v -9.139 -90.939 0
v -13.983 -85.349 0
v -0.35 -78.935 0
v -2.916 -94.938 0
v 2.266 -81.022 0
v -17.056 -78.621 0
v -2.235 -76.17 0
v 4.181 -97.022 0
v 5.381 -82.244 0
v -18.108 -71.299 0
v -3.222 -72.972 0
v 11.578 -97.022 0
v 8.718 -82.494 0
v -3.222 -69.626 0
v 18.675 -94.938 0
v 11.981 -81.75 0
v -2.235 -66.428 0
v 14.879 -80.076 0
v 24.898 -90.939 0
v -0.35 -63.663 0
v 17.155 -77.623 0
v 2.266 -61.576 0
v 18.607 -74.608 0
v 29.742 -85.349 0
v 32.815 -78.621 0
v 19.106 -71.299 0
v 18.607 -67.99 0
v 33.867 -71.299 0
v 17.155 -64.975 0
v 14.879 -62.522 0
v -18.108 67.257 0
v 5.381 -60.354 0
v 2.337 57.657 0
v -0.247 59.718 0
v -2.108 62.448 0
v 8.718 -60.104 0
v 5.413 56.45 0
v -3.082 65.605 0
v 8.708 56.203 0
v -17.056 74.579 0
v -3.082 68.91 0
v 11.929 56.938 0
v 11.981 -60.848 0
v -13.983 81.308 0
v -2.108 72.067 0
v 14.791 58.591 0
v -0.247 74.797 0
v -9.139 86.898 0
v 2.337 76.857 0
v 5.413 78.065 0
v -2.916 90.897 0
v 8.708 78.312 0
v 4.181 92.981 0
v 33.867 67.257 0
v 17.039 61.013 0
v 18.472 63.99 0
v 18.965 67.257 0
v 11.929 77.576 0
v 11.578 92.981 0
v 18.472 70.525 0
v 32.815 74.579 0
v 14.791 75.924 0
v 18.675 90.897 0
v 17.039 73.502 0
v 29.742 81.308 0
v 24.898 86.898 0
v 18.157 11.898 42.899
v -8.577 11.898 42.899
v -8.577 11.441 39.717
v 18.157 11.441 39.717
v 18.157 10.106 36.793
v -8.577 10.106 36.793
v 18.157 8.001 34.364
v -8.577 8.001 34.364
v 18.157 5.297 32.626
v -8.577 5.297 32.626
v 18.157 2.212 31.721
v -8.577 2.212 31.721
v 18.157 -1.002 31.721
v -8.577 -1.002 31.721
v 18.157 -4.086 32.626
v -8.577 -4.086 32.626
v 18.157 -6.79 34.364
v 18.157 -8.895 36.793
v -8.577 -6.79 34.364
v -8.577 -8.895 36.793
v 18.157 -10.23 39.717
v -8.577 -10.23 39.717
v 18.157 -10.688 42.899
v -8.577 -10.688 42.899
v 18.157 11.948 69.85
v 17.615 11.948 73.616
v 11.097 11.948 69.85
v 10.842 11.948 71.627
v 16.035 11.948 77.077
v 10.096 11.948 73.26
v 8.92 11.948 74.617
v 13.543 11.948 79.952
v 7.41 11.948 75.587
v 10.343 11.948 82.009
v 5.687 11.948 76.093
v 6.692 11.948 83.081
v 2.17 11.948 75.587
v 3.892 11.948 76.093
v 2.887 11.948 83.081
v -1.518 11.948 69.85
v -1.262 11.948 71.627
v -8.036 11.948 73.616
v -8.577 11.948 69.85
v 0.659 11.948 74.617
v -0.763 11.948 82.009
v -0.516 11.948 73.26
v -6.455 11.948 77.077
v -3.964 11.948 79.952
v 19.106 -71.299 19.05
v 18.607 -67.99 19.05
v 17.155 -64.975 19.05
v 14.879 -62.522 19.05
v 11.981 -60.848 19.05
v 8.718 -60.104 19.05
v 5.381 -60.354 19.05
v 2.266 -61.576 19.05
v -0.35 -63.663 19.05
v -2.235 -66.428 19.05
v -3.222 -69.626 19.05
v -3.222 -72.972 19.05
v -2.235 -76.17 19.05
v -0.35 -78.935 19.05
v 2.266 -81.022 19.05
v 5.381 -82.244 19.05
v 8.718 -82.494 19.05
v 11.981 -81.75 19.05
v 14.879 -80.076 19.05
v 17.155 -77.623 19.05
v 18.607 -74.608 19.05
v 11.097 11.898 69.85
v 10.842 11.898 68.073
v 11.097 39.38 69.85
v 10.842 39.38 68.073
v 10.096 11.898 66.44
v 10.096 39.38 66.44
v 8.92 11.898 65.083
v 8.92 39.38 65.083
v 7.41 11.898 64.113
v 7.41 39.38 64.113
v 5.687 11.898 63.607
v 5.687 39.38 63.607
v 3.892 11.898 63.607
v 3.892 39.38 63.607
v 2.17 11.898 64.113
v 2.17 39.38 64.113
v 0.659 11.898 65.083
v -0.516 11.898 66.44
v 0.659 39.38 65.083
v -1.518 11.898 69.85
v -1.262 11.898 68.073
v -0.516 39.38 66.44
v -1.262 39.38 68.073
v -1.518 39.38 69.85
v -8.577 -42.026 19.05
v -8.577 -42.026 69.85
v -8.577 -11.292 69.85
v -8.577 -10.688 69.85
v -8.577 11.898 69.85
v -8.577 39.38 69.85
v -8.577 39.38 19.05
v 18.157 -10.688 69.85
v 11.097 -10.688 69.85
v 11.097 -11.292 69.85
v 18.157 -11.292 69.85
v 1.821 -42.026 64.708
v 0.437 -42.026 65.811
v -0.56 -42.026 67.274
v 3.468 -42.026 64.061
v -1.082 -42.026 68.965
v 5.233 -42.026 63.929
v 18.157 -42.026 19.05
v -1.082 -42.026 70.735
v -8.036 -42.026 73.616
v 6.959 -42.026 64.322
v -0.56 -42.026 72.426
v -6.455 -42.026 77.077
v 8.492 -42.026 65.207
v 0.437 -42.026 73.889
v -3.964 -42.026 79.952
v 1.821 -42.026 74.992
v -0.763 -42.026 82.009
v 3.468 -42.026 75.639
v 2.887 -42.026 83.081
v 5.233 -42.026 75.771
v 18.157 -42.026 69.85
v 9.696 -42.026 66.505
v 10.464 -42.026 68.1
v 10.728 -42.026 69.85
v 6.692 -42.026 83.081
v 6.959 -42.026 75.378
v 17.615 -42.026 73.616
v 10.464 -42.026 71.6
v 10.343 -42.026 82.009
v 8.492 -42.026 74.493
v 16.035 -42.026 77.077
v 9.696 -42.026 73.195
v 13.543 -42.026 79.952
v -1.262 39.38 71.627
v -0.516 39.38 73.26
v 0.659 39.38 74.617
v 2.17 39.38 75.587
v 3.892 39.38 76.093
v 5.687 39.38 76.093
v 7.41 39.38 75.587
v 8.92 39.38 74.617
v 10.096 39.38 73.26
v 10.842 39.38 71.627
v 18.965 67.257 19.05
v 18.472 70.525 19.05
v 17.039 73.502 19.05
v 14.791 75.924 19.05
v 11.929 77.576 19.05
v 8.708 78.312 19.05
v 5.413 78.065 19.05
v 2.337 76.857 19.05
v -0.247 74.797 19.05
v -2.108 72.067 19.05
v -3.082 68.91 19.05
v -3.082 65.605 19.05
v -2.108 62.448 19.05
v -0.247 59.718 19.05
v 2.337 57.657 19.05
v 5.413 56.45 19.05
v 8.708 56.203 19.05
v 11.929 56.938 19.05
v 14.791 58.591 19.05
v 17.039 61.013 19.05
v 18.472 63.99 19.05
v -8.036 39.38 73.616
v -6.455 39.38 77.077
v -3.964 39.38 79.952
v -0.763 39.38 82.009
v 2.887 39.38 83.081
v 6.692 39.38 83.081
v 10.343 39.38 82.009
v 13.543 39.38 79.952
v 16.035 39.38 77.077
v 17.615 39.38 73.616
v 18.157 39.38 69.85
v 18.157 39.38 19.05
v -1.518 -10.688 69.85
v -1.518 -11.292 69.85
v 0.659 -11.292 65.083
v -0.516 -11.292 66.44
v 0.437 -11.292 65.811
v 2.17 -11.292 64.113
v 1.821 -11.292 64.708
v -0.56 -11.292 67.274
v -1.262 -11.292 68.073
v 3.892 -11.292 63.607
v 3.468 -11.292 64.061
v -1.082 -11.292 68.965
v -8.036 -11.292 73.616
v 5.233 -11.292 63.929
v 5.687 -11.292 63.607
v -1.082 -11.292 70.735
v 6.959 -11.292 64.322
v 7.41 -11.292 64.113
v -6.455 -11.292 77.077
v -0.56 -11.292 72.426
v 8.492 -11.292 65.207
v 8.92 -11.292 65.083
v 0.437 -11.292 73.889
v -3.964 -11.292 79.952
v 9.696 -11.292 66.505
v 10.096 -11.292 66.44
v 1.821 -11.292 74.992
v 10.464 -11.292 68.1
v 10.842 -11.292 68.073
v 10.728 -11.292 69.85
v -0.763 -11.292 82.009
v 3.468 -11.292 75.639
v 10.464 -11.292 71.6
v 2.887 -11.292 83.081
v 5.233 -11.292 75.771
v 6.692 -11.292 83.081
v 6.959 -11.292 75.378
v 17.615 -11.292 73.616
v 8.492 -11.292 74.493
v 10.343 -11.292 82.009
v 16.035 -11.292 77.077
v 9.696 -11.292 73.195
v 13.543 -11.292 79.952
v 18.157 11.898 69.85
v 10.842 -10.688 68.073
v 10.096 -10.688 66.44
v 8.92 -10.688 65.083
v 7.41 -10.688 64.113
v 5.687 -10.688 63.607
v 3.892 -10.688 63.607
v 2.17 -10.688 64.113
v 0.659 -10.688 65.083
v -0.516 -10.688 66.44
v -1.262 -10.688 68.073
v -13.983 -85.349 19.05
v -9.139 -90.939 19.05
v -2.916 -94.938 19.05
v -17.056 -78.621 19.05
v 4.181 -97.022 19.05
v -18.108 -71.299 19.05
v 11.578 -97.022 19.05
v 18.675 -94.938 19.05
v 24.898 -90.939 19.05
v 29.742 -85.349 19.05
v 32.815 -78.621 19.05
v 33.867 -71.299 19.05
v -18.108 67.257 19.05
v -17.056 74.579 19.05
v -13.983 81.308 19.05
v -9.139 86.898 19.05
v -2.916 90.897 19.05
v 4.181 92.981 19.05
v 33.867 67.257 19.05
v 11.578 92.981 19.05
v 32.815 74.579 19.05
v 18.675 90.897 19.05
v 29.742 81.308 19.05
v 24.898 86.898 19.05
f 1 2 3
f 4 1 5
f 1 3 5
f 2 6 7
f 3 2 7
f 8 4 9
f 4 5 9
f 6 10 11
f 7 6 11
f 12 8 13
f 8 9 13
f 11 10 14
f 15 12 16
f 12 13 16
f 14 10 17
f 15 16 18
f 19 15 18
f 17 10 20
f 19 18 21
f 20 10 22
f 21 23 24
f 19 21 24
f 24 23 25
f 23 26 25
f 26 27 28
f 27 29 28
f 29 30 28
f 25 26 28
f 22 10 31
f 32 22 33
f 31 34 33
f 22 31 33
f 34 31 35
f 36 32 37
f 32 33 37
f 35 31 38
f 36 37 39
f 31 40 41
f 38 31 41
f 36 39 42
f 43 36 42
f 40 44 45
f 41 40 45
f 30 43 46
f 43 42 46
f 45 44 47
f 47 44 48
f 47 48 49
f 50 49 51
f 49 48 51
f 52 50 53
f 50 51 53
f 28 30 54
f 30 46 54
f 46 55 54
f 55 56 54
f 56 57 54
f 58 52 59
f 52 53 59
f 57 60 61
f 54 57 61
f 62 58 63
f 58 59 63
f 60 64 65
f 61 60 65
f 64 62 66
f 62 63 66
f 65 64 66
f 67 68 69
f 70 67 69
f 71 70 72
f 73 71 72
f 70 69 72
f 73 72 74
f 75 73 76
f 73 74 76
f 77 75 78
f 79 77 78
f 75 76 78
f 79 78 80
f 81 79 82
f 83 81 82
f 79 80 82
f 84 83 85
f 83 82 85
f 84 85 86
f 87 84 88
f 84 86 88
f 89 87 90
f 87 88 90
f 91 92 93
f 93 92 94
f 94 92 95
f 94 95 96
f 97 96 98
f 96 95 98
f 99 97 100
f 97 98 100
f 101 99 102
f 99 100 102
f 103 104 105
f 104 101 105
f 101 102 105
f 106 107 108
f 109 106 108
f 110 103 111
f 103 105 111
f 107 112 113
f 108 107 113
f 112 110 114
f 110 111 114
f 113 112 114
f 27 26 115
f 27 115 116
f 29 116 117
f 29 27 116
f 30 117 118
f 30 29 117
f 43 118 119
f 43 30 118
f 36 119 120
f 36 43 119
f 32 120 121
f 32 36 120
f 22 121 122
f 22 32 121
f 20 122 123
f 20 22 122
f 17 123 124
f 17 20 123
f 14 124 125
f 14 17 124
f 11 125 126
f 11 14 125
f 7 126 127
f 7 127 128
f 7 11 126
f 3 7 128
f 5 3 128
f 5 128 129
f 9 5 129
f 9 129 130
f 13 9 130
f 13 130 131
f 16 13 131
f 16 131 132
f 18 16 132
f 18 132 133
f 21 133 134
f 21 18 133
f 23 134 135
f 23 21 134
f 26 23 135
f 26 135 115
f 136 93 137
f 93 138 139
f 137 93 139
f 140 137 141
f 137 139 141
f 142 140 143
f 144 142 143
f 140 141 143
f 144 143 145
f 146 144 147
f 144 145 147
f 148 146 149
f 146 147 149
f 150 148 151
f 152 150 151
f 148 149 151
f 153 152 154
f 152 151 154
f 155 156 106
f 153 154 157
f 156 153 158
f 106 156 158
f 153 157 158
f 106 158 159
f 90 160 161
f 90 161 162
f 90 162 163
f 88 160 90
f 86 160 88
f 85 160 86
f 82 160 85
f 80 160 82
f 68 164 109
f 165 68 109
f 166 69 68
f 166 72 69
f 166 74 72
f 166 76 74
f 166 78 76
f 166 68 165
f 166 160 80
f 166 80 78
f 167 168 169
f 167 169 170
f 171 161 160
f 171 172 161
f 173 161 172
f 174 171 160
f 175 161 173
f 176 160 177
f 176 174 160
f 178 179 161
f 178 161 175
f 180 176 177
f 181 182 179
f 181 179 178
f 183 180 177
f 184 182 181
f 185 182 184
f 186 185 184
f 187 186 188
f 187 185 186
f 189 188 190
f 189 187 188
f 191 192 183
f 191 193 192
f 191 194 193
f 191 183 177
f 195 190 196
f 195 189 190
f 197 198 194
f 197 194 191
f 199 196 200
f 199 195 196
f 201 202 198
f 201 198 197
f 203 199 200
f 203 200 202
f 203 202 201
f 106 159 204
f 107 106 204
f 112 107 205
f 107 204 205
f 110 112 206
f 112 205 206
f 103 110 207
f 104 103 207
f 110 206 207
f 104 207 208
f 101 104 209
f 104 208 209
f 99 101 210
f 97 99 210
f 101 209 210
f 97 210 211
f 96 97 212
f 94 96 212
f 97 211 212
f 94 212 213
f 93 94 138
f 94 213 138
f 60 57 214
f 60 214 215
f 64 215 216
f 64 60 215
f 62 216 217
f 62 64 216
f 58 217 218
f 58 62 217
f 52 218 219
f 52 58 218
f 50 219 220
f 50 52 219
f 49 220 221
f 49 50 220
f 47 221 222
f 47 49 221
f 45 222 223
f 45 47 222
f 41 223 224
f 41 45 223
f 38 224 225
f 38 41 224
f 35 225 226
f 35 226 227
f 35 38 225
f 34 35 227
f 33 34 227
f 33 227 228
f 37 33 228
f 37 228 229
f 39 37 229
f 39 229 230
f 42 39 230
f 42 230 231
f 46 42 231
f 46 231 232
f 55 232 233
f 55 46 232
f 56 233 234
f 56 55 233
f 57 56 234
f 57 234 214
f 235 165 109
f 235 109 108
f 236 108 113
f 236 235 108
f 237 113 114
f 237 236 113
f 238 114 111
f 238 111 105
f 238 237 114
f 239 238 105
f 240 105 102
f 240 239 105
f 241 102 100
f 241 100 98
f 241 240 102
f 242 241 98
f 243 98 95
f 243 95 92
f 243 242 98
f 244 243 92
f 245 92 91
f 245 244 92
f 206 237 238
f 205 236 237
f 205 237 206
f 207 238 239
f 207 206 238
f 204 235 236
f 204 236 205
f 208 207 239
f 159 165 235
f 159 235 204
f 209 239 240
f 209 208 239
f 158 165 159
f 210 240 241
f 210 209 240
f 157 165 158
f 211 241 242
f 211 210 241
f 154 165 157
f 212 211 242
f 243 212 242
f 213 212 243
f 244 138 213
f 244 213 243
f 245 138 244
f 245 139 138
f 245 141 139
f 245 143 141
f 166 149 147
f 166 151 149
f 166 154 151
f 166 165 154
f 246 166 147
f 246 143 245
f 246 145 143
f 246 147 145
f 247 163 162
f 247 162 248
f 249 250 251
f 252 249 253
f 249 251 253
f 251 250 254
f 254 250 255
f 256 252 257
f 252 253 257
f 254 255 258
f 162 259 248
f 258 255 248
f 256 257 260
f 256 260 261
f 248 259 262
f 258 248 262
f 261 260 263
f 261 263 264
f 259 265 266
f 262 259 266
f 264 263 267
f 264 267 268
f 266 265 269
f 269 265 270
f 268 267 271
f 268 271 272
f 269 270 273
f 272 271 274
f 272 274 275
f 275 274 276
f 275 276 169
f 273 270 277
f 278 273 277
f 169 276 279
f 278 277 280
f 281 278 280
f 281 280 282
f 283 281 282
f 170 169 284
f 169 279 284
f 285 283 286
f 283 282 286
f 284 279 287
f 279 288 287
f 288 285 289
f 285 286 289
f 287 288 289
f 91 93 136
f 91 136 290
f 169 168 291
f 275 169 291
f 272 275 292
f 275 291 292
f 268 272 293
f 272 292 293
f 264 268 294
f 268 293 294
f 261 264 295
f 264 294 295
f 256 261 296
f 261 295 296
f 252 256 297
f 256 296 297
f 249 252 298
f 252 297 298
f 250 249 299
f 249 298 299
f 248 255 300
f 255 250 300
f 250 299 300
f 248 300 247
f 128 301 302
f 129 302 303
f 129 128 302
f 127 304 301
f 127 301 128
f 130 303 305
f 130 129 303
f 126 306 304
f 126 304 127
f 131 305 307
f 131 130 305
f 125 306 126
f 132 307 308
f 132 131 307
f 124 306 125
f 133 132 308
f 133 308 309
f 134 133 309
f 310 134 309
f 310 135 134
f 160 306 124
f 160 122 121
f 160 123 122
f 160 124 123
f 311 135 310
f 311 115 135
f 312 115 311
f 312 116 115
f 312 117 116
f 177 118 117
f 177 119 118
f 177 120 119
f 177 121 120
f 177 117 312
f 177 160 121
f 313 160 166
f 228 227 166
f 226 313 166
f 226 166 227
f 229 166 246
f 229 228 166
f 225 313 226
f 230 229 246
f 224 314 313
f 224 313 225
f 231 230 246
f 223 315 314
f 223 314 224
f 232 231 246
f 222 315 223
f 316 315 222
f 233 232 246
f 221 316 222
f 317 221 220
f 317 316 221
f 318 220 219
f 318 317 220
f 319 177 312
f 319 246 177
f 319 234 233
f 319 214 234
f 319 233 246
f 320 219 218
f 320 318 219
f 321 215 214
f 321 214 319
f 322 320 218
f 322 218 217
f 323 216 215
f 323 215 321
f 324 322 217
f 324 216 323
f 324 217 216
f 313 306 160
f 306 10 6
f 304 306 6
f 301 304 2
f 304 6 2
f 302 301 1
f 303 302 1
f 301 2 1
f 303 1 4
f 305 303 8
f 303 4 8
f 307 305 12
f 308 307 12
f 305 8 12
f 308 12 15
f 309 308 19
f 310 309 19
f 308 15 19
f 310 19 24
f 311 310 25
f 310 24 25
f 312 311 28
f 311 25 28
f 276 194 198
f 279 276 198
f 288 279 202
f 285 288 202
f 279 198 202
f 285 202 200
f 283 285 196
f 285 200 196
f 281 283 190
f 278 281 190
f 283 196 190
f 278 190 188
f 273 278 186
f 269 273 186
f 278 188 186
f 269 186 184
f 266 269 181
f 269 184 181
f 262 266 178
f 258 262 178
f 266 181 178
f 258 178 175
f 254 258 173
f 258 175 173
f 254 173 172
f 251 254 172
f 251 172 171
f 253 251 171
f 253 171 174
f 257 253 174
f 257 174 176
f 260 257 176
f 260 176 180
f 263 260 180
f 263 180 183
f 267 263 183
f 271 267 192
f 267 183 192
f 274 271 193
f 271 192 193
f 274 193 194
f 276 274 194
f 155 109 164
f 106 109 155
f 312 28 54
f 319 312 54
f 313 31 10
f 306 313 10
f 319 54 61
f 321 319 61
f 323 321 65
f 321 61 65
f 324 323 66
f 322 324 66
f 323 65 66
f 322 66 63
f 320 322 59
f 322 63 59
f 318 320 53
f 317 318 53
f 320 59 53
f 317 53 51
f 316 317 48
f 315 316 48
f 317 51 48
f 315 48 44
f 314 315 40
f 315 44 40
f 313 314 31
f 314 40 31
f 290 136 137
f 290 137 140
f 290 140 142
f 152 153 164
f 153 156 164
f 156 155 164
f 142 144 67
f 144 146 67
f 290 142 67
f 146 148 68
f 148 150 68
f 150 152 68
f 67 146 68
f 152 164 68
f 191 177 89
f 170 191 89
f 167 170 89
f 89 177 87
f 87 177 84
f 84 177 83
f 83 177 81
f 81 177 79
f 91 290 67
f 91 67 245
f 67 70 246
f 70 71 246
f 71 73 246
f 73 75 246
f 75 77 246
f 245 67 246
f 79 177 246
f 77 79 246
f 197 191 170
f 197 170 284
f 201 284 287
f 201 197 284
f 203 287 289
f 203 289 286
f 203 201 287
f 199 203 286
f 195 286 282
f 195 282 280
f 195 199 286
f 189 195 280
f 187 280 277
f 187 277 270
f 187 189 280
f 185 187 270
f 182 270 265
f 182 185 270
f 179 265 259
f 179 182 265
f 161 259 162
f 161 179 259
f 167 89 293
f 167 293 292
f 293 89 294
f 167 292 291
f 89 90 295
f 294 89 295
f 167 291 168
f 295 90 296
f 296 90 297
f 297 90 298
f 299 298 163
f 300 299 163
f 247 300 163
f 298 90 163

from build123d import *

# Parameters (mm, degrees)
F0_R      = 11.2267046734
F0_R_2    = 11.0852071495
F1_DEPTH  = 19.05
F2_W      = 26.7343660817
F2_H      = 81.4062468708
F3_DEPTH  = 50.8
F5_DEPTH  = 42.4459602142
F6_R      = 6.3073673096
F7_DEPTH  = 27.432
F8_DEPTH  = 136.6678641567
F9_R      = 5.937984747
F10_DEPTH = 30.734


with BuildPart() as f1:
    # F0 (on Top) → F1 (new body)
    with BuildSketch(Plane.XY):
        with BuildLine():
            Line((-18.1084536016, 67.2573745251), (-18.1084536016, -71.298904717))
            ThreePointArc((-18.1084536016, -71.298904717), (7.8795179725, -97.286876291), (33.8674895465, -71.298904717))
            Line((33.8674895465, -71.298904717), (33.8674895465, 67.2573745251))
            ThreePointArc((33.8674895465, 67.2573745251), (7.8795179725, 93.2453460991), (-18.1084536016, 67.2573745251))
        make_face()
        with Locations((7.8795179725, -71.298904717)):
            Circle(F0_R, mode=Mode.SUBTRACT)
        with Locations((7.8795179725, 67.2573745251)):
            Circle(F0_R_2, mode=Mode.SUBTRACT)
    extrude(amount=F1_DEPTH)

    # F2 (on face) → F3 (join)
    with BuildSketch(Plane.XY.offset(19.05)):
        with Locations((4.7897123732, -1.3231355697)):
            Rectangle(F2_W, F2_H)
    extrude(amount=F3_DEPTH)

    # F4 (on face) → F5 (cut, through all)
    with BuildSketch(Plane(origin=(-8.5774706677, 0, 0), x_dir=(0, -1, 0), z_dir=(-1, 0, 0))):
        with BuildLine():
            Line((10.6878159568, 69.85), (-11.8984412402, 69.85))
            Line((-11.8984412402, 69.85), (-11.8984412402, 42.8989976645))
            ThreePointArc((-11.8984412402, 42.8989976645), (-0.6053126417, 31.605869066), (10.6878159568, 42.8989976645))
            Line((10.6878159568, 42.8989976645), (10.6878159568, 69.85))
        make_face()
    extrude(amount=-F5_DEPTH, mode=Mode.SUBTRACT)

    # F6 (on face) → F7 (join)
    with BuildSketch(Plane(origin=(0, 39.3799878657, 0), x_dir=(-1, 0, 0), z_dir=(0, 1, 0))):
        with Locations((-4.7897123732, 69.85)):
            Circle(F6_R)
        with BuildLine():
            Line((1.5176549365, 69.85), (8.5774706677, 69.85))
            ThreePointArc((8.5774706677, 69.85), (-4.7897123732, 83.2171830408), (-18.156895414, 69.85))
            Line((-18.156895414, 69.85), (-11.0970796828, 69.85))
            ThreePointArc((-11.0970796828, 69.85), (-4.7897123732, 76.1573673096), (1.5176549365, 69.85))
        make_face()
    extrude(amount=-F7_DEPTH)

    # F6 (on face) → F8 (cut, through all)
    with BuildSketch(Plane(origin=(0, 39.3799878657, 0), x_dir=(-1, 0, 0), z_dir=(0, 1, 0))):
        with BuildLine():
            ThreePointArc((-11.0970796828, 69.85), (-4.7897123732, 63.5426326904), (1.5176549365, 69.85))
            Line((1.5176549365, 69.85), (-11.0970796828, 69.85))
        make_face()
        with BuildLine():
            Line((-11.0970796828, 69.85), (1.5176549365, 69.85))
            ThreePointArc((1.5176549365, 69.85), (-4.7897123732, 76.1573673096), (-11.0970796828, 69.85))
        make_face()
    extrude(amount=-F8_DEPTH, mode=Mode.SUBTRACT)

    # F9 (on face) → F10 (join)
    with BuildSketch(Plane.XZ.offset(42.0262590051)):
        with BuildLine():
            Line((11.0970796828, 69.85), (18.156895414, 69.85))
            ThreePointArc((18.156895414, 69.85), (4.7897123732, 83.2171830408), (-8.5774706677, 69.85))
            Line((-8.5774706677, 69.85), (-1.5176549365, 69.85))
            ThreePointArc((-1.5176549365, 69.85), (4.7897123732, 63.5426326904), (11.0970796828, 69.85))
        make_face()
        with Locations((4.7897123732, 69.85)):
            Circle(F9_R, mode=Mode.SUBTRACT)
    extrude(amount=-F10_DEPTH)


solid = f1.part
